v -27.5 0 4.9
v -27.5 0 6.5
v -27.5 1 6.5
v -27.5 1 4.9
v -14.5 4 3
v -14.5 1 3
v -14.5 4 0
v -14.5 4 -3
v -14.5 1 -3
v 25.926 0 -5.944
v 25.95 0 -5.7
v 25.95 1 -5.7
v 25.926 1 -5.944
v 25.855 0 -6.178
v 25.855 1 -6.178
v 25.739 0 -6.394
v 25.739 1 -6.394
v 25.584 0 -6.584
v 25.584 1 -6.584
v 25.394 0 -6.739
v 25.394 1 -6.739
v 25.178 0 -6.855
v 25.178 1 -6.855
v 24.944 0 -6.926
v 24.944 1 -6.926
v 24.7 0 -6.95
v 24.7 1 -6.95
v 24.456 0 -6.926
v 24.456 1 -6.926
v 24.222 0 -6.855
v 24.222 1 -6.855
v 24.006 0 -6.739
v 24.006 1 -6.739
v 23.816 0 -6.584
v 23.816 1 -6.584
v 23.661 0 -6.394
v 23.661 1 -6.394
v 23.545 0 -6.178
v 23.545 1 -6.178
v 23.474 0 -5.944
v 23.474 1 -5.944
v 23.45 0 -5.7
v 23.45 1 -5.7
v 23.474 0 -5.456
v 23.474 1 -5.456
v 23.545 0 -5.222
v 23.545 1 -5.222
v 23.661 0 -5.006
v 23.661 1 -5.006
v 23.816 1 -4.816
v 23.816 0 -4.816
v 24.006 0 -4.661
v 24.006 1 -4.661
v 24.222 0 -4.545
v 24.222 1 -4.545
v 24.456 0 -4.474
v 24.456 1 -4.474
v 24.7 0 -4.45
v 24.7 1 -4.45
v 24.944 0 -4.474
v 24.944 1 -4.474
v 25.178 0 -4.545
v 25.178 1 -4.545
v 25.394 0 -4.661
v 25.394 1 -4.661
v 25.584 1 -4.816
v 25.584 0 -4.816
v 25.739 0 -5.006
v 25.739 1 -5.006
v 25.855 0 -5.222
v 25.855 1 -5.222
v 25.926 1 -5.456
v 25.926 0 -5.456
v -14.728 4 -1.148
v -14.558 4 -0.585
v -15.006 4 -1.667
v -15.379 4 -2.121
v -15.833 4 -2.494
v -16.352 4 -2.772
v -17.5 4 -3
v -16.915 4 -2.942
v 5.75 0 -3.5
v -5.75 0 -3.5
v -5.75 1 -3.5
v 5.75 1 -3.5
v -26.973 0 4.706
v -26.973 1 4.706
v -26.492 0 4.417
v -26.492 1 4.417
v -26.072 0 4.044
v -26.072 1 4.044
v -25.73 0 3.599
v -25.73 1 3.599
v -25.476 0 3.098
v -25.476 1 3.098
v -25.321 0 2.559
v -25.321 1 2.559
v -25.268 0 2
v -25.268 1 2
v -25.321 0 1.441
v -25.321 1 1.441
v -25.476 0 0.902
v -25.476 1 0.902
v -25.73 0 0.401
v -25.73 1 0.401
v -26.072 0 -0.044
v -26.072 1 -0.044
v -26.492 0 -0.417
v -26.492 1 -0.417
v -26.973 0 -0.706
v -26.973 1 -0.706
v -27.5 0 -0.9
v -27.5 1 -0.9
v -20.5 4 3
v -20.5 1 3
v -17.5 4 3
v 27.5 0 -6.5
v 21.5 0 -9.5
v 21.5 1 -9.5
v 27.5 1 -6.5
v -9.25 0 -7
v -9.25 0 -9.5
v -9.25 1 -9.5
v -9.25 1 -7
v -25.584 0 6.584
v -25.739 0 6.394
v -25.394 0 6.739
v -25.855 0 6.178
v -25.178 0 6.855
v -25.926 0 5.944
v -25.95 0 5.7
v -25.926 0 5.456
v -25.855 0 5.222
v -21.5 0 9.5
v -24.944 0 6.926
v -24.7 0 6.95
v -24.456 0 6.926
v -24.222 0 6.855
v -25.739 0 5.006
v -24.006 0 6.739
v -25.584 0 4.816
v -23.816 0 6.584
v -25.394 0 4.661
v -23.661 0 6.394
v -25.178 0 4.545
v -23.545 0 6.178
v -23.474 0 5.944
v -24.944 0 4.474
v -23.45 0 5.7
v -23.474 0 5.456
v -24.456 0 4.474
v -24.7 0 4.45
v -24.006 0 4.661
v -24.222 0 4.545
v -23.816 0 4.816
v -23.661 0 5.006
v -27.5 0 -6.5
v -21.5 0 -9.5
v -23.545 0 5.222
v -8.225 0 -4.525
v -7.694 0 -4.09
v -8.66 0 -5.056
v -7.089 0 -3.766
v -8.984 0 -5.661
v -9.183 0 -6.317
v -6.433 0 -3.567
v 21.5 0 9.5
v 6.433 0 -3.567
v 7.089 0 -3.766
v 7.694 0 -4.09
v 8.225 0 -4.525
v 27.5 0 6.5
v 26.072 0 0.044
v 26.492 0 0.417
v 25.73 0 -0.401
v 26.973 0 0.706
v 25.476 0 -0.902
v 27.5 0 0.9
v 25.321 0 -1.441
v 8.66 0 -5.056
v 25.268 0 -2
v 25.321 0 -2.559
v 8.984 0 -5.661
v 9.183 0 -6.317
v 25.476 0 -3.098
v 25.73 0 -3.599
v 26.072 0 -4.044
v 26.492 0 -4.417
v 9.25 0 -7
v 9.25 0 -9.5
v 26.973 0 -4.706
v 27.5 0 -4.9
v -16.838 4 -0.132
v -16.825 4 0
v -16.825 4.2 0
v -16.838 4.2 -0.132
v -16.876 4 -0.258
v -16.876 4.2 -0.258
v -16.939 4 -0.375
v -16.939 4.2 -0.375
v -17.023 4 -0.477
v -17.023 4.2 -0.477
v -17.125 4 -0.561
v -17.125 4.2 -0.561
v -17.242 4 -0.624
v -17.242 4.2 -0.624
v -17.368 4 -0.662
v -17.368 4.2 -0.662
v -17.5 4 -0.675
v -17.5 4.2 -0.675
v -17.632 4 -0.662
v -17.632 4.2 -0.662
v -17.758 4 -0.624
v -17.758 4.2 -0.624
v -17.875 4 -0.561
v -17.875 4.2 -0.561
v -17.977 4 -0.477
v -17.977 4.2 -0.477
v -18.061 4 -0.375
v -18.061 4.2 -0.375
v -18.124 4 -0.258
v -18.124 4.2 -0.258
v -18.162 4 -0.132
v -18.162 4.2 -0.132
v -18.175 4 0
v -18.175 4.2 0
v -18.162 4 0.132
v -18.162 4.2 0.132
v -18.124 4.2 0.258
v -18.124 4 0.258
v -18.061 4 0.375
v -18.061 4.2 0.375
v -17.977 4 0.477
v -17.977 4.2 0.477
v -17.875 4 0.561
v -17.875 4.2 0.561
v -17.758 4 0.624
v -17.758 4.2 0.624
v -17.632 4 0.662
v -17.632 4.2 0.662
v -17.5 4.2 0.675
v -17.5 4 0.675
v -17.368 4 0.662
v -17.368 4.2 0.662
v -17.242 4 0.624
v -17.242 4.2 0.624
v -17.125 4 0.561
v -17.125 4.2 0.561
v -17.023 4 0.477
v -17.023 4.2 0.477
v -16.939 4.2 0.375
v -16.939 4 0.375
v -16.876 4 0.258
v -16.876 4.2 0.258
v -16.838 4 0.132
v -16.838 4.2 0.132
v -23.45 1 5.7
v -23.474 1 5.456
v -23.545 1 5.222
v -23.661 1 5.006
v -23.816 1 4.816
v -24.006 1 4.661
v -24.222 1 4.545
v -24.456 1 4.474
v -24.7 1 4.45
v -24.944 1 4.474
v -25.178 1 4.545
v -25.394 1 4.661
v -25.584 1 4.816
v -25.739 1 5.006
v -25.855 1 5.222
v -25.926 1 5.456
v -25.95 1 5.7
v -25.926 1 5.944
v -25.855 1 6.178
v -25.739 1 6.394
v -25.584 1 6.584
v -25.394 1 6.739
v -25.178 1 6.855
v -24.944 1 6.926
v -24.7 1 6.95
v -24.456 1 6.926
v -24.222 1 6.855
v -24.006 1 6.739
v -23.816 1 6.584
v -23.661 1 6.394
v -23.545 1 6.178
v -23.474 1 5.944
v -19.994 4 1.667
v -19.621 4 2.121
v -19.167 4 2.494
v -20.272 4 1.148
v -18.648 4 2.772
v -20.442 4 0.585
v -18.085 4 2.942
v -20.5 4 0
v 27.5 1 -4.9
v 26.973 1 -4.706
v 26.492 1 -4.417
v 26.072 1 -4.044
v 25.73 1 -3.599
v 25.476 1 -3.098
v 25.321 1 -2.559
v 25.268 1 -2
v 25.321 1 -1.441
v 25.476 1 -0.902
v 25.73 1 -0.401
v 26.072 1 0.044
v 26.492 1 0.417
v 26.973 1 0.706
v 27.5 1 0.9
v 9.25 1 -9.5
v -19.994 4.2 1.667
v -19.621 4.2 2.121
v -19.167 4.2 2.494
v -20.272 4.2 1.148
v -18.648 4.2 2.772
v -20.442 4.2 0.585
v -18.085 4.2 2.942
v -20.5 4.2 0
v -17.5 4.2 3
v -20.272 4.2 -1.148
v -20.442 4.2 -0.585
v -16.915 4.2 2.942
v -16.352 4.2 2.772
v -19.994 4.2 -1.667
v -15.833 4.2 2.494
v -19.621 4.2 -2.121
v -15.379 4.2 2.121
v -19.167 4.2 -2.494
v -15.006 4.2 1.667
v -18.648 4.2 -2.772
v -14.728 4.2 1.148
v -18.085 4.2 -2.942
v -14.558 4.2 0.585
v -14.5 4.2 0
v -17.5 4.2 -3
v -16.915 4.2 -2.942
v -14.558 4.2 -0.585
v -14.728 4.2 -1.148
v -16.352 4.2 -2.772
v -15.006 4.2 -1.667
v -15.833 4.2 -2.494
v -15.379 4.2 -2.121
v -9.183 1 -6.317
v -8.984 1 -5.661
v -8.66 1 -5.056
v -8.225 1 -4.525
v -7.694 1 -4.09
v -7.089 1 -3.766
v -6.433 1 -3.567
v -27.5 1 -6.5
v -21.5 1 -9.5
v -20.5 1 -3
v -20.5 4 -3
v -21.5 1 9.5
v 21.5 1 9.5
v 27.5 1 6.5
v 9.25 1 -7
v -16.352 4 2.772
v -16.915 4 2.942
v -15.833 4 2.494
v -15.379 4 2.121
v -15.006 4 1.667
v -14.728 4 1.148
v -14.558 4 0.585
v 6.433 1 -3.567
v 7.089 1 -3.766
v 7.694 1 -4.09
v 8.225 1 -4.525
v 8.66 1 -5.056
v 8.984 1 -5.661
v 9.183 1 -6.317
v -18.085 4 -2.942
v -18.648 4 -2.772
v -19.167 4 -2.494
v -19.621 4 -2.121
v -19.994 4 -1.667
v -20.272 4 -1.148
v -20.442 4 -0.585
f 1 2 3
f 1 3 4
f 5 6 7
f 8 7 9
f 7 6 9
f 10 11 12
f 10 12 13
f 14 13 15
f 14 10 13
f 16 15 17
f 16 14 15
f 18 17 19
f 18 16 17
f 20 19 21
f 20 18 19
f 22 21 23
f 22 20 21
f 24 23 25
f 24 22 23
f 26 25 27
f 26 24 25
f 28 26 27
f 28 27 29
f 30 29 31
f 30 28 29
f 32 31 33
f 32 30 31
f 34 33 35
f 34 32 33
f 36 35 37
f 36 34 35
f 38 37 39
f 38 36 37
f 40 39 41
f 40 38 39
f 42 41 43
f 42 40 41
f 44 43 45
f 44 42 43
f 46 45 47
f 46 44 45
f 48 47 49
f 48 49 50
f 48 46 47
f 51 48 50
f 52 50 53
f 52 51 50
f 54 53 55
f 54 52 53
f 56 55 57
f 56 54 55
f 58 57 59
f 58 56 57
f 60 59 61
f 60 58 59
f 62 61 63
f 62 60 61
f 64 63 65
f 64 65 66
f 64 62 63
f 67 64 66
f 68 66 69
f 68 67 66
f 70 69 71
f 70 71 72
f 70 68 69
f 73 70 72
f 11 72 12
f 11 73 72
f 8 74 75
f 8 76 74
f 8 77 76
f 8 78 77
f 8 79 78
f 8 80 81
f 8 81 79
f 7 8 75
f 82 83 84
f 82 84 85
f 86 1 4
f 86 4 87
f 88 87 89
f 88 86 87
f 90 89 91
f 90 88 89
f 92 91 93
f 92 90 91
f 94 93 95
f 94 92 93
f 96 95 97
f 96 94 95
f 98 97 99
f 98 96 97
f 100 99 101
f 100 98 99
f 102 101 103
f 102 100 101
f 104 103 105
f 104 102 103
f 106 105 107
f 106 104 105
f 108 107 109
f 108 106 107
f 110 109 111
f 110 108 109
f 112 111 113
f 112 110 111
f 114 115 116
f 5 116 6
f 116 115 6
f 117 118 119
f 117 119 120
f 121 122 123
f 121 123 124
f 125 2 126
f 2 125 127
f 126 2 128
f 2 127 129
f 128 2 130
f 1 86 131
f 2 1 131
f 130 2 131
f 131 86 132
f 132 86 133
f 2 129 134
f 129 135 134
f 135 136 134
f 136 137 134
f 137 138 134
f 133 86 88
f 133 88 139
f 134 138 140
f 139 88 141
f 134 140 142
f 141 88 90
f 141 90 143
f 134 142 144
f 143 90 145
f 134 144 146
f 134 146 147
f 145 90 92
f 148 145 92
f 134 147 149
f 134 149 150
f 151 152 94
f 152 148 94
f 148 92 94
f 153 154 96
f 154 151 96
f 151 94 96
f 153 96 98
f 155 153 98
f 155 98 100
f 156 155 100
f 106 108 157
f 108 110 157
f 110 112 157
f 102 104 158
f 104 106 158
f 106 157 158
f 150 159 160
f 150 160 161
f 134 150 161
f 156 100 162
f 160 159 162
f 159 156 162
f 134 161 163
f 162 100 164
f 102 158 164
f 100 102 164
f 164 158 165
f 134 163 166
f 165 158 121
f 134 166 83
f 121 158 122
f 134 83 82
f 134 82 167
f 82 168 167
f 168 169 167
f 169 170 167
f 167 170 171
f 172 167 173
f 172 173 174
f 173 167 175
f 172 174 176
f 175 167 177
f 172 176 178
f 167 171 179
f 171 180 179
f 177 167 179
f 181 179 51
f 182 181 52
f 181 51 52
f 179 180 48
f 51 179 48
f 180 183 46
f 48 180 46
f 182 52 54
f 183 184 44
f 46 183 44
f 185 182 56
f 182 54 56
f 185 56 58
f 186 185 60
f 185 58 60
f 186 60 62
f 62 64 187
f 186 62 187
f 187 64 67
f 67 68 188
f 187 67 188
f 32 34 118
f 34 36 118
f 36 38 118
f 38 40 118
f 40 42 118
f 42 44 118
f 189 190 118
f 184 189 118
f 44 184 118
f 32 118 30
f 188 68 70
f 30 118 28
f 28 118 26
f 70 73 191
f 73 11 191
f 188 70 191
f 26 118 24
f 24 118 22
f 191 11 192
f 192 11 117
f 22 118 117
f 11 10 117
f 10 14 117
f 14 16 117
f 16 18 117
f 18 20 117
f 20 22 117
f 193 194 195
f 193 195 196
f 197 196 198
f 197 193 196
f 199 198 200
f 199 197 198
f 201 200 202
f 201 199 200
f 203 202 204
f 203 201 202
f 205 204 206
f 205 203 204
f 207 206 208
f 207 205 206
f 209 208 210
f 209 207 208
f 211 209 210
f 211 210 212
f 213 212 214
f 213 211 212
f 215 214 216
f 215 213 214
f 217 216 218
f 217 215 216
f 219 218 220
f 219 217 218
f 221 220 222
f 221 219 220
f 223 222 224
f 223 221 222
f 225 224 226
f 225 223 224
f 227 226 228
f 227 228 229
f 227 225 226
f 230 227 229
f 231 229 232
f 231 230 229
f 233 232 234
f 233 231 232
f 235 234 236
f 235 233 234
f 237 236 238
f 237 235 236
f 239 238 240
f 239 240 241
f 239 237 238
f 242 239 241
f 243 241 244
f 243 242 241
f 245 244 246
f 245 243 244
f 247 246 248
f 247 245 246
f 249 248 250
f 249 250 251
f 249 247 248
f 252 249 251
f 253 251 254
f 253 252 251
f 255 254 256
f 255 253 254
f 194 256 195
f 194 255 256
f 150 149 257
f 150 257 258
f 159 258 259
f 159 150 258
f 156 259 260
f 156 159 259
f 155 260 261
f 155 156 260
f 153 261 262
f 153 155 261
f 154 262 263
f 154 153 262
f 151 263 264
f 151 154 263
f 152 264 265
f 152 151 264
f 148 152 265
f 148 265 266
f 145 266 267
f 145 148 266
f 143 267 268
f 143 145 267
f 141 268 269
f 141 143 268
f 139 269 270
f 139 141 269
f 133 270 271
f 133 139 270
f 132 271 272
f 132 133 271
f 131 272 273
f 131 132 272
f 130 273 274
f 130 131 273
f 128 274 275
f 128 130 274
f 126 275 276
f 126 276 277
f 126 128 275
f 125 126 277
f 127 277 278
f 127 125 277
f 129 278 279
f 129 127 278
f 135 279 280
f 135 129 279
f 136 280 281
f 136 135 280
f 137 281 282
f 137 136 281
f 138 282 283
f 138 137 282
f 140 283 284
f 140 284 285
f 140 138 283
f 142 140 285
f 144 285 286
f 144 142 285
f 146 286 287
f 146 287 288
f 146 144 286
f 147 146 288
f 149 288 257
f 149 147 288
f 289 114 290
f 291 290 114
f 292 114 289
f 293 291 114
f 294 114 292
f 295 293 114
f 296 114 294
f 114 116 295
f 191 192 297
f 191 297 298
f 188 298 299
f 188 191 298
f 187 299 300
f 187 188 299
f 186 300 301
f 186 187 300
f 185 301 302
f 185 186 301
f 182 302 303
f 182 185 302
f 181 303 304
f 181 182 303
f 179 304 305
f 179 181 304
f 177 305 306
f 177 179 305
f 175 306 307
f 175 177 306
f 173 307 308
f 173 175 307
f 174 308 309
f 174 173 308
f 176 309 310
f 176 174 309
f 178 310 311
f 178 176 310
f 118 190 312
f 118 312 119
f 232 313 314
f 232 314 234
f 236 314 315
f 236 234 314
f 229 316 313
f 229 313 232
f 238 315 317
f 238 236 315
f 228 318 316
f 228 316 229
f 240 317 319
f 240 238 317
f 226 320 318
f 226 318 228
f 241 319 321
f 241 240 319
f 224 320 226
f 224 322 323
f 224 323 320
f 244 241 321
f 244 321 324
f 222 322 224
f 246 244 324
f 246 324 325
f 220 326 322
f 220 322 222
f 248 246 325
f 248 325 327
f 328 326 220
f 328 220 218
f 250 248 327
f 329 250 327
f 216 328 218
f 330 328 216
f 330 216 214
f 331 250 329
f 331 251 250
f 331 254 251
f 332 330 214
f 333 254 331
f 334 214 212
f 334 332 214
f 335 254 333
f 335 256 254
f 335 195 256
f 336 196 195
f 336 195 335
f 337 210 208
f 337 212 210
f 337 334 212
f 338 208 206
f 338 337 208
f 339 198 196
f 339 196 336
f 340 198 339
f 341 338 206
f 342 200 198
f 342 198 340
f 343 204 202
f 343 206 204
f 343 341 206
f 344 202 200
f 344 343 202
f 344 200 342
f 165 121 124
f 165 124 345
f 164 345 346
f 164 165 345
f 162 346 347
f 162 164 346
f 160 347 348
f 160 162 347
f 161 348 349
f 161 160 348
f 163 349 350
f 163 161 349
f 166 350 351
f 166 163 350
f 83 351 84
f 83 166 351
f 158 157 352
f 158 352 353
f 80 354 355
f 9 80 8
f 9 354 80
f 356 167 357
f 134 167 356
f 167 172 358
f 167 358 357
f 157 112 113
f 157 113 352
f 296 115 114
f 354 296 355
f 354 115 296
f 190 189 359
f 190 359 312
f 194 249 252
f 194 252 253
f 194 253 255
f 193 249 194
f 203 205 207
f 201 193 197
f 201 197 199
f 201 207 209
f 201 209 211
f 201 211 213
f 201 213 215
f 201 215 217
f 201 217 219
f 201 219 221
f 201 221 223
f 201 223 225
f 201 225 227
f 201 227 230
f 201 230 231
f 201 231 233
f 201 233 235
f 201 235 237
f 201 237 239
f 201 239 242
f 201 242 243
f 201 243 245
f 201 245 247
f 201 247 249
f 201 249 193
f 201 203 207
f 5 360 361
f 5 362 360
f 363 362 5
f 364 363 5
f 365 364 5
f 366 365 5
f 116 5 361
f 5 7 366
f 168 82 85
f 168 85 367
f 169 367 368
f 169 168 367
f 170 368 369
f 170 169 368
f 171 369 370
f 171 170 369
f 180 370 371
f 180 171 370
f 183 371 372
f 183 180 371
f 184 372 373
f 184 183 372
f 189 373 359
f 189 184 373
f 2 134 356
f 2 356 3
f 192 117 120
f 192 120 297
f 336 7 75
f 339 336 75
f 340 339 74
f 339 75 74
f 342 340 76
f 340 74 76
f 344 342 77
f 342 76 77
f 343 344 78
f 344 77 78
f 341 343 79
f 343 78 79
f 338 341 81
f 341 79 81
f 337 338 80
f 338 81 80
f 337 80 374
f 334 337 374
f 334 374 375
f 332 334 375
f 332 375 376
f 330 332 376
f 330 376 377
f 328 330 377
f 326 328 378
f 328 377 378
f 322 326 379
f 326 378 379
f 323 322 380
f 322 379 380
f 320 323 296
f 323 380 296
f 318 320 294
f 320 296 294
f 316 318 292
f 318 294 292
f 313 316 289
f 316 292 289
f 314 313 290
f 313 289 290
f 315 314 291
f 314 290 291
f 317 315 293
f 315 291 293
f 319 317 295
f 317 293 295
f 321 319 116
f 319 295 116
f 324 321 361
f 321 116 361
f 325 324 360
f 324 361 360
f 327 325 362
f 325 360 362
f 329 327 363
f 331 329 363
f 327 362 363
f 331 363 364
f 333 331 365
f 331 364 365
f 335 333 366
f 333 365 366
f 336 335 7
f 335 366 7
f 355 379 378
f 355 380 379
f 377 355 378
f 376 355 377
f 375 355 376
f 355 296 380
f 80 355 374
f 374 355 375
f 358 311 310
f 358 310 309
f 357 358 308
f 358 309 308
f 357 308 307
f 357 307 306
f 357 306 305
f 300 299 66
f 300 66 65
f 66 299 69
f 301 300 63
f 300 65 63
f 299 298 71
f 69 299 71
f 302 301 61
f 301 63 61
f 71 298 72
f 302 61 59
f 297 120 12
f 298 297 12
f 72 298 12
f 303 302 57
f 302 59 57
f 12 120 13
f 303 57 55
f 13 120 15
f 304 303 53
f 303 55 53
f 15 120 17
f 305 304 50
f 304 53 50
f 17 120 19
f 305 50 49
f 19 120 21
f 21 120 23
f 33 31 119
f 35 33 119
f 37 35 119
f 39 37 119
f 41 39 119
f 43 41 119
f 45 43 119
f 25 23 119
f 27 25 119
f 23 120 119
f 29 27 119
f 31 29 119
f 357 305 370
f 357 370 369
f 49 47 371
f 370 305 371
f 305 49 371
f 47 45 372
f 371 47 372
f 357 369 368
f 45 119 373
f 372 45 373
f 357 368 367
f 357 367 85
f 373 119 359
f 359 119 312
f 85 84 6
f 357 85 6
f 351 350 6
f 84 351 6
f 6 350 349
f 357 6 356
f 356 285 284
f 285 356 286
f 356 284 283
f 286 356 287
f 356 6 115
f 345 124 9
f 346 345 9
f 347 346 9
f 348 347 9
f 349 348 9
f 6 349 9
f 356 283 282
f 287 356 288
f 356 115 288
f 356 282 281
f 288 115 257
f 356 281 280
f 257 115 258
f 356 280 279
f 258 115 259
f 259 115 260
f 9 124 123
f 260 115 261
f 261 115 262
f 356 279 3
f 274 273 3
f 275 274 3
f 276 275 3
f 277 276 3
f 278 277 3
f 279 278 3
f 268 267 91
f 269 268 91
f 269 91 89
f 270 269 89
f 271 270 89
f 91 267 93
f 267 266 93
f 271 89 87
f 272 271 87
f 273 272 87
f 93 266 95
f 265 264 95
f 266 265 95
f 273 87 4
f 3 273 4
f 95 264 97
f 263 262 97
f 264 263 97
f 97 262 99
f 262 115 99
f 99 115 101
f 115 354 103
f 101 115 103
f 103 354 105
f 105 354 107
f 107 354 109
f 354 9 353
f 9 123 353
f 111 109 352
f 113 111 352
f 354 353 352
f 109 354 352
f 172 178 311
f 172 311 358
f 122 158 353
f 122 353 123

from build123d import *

# Parameters (mm, degrees)
SKETCH_1_R      = 1.25
EXTRUDE_1_DEPTH = 1
SKETCH_1_3_W    = 6
SKETCH_1_3_H    = 6
EXTRUDE_2_DEPTH = 4
EXTRUDE_START   = 4
SKETCH_1_4_R    = 0.675
EXTRUDE_5_DEPTH = 0.2


with BuildPart() as part:
    # 草圖1 → 填料-伸長1 (new body)
    with BuildSketch(Plane(origin=(0, 0, 0), x_dir=(1, 0, 0), z_dir=(0, 1, 0))):
        with BuildLine():
            Line((-27.5, -6.5), (-21.5, -9.5))
            Line((-21.5, -9.5), (21.5, -9.5))
            Line((21.5, -9.5), (27.5, -6.5))
            Line((27.5, -6.5), (27.5, -0.9))
            ThreePointArc((27.5, -0.9), (25.268114575, 2), (27.5, 4.9))
            Line((27.5, 4.9), (27.5, 6.5))
            Line((27.5, 6.5), (21.5, 9.5))
            Line((21.5, 9.5), (9.25, 9.5))
            Line((9.25, 9.5), (9.25, 7))
            ThreePointArc((9.25, 7), (8.224873734, 4.525126266), (5.75, 3.5))
            Line((5.75, 3.5), (-5.75, 3.5))
            ThreePointArc((-5.75, 3.5), (-8.224873734, 4.525126266), (-9.25, 7))
            Line((-9.25, 7), (-9.25, 9.5))
            Line((-9.25, 9.5), (-21.5, 9.5))
            Line((-21.5, 9.5), (-27.5, 6.5))
            Line((-27.5, 6.5), (-27.5, 0.9))
            ThreePointArc((-27.5, 0.9), (-25.268114575, -2), (-27.5, -4.9))
            Line((-27.5, -4.9), (-27.5, -6.5))
        make_face()
        with Locations((-24.699999952, -5.700000209)):
            Circle(SKETCH_1_R, mode=Mode.SUBTRACT)
        with Locations((24.7, 5.7)):
            Circle(SKETCH_1_R, mode=Mode.SUBTRACT)
    extrude(amount=EXTRUDE_1_DEPTH)

    # 草圖1<3> → 填料-伸長2 (add)
    with BuildSketch(Plane(origin=(0, 0, 0), x_dir=(1, 0, 0), z_dir=(0, 1, 0))):
        with Locations((-17.5, 0)):
            Rectangle(SKETCH_1_3_W, SKETCH_1_3_H)
    extrude(amount=EXTRUDE_2_DEPTH)

    # 草圖1<4> → 填料-伸長5 (add)
    with BuildSketch(Plane(origin=(0, 0, 0), x_dir=(1, 0, 0), z_dir=(0, 1, 0)).offset(EXTRUDE_START)):
        with BuildLine():
            ThreePointArc((-20.5, 0), (-19.621320344, -2.121320344), (-17.5, -3))
            ThreePointArc((-17.5, -3), (-15.378679656, -2.121320344), (-14.5, 0))
            ThreePointArc((-14.5, 0), (-15.378679656, 2.121320344), (-17.5, 3))
            ThreePointArc((-17.5, 3), (-19.621320344, 2.121320344), (-20.5, 0))
        make_face()
        with Locations((-17.5, 0)):
            Circle(SKETCH_1_4_R, mode=Mode.SUBTRACT)
    extrude(amount=EXTRUDE_5_DEPTH)


solid = part.part
